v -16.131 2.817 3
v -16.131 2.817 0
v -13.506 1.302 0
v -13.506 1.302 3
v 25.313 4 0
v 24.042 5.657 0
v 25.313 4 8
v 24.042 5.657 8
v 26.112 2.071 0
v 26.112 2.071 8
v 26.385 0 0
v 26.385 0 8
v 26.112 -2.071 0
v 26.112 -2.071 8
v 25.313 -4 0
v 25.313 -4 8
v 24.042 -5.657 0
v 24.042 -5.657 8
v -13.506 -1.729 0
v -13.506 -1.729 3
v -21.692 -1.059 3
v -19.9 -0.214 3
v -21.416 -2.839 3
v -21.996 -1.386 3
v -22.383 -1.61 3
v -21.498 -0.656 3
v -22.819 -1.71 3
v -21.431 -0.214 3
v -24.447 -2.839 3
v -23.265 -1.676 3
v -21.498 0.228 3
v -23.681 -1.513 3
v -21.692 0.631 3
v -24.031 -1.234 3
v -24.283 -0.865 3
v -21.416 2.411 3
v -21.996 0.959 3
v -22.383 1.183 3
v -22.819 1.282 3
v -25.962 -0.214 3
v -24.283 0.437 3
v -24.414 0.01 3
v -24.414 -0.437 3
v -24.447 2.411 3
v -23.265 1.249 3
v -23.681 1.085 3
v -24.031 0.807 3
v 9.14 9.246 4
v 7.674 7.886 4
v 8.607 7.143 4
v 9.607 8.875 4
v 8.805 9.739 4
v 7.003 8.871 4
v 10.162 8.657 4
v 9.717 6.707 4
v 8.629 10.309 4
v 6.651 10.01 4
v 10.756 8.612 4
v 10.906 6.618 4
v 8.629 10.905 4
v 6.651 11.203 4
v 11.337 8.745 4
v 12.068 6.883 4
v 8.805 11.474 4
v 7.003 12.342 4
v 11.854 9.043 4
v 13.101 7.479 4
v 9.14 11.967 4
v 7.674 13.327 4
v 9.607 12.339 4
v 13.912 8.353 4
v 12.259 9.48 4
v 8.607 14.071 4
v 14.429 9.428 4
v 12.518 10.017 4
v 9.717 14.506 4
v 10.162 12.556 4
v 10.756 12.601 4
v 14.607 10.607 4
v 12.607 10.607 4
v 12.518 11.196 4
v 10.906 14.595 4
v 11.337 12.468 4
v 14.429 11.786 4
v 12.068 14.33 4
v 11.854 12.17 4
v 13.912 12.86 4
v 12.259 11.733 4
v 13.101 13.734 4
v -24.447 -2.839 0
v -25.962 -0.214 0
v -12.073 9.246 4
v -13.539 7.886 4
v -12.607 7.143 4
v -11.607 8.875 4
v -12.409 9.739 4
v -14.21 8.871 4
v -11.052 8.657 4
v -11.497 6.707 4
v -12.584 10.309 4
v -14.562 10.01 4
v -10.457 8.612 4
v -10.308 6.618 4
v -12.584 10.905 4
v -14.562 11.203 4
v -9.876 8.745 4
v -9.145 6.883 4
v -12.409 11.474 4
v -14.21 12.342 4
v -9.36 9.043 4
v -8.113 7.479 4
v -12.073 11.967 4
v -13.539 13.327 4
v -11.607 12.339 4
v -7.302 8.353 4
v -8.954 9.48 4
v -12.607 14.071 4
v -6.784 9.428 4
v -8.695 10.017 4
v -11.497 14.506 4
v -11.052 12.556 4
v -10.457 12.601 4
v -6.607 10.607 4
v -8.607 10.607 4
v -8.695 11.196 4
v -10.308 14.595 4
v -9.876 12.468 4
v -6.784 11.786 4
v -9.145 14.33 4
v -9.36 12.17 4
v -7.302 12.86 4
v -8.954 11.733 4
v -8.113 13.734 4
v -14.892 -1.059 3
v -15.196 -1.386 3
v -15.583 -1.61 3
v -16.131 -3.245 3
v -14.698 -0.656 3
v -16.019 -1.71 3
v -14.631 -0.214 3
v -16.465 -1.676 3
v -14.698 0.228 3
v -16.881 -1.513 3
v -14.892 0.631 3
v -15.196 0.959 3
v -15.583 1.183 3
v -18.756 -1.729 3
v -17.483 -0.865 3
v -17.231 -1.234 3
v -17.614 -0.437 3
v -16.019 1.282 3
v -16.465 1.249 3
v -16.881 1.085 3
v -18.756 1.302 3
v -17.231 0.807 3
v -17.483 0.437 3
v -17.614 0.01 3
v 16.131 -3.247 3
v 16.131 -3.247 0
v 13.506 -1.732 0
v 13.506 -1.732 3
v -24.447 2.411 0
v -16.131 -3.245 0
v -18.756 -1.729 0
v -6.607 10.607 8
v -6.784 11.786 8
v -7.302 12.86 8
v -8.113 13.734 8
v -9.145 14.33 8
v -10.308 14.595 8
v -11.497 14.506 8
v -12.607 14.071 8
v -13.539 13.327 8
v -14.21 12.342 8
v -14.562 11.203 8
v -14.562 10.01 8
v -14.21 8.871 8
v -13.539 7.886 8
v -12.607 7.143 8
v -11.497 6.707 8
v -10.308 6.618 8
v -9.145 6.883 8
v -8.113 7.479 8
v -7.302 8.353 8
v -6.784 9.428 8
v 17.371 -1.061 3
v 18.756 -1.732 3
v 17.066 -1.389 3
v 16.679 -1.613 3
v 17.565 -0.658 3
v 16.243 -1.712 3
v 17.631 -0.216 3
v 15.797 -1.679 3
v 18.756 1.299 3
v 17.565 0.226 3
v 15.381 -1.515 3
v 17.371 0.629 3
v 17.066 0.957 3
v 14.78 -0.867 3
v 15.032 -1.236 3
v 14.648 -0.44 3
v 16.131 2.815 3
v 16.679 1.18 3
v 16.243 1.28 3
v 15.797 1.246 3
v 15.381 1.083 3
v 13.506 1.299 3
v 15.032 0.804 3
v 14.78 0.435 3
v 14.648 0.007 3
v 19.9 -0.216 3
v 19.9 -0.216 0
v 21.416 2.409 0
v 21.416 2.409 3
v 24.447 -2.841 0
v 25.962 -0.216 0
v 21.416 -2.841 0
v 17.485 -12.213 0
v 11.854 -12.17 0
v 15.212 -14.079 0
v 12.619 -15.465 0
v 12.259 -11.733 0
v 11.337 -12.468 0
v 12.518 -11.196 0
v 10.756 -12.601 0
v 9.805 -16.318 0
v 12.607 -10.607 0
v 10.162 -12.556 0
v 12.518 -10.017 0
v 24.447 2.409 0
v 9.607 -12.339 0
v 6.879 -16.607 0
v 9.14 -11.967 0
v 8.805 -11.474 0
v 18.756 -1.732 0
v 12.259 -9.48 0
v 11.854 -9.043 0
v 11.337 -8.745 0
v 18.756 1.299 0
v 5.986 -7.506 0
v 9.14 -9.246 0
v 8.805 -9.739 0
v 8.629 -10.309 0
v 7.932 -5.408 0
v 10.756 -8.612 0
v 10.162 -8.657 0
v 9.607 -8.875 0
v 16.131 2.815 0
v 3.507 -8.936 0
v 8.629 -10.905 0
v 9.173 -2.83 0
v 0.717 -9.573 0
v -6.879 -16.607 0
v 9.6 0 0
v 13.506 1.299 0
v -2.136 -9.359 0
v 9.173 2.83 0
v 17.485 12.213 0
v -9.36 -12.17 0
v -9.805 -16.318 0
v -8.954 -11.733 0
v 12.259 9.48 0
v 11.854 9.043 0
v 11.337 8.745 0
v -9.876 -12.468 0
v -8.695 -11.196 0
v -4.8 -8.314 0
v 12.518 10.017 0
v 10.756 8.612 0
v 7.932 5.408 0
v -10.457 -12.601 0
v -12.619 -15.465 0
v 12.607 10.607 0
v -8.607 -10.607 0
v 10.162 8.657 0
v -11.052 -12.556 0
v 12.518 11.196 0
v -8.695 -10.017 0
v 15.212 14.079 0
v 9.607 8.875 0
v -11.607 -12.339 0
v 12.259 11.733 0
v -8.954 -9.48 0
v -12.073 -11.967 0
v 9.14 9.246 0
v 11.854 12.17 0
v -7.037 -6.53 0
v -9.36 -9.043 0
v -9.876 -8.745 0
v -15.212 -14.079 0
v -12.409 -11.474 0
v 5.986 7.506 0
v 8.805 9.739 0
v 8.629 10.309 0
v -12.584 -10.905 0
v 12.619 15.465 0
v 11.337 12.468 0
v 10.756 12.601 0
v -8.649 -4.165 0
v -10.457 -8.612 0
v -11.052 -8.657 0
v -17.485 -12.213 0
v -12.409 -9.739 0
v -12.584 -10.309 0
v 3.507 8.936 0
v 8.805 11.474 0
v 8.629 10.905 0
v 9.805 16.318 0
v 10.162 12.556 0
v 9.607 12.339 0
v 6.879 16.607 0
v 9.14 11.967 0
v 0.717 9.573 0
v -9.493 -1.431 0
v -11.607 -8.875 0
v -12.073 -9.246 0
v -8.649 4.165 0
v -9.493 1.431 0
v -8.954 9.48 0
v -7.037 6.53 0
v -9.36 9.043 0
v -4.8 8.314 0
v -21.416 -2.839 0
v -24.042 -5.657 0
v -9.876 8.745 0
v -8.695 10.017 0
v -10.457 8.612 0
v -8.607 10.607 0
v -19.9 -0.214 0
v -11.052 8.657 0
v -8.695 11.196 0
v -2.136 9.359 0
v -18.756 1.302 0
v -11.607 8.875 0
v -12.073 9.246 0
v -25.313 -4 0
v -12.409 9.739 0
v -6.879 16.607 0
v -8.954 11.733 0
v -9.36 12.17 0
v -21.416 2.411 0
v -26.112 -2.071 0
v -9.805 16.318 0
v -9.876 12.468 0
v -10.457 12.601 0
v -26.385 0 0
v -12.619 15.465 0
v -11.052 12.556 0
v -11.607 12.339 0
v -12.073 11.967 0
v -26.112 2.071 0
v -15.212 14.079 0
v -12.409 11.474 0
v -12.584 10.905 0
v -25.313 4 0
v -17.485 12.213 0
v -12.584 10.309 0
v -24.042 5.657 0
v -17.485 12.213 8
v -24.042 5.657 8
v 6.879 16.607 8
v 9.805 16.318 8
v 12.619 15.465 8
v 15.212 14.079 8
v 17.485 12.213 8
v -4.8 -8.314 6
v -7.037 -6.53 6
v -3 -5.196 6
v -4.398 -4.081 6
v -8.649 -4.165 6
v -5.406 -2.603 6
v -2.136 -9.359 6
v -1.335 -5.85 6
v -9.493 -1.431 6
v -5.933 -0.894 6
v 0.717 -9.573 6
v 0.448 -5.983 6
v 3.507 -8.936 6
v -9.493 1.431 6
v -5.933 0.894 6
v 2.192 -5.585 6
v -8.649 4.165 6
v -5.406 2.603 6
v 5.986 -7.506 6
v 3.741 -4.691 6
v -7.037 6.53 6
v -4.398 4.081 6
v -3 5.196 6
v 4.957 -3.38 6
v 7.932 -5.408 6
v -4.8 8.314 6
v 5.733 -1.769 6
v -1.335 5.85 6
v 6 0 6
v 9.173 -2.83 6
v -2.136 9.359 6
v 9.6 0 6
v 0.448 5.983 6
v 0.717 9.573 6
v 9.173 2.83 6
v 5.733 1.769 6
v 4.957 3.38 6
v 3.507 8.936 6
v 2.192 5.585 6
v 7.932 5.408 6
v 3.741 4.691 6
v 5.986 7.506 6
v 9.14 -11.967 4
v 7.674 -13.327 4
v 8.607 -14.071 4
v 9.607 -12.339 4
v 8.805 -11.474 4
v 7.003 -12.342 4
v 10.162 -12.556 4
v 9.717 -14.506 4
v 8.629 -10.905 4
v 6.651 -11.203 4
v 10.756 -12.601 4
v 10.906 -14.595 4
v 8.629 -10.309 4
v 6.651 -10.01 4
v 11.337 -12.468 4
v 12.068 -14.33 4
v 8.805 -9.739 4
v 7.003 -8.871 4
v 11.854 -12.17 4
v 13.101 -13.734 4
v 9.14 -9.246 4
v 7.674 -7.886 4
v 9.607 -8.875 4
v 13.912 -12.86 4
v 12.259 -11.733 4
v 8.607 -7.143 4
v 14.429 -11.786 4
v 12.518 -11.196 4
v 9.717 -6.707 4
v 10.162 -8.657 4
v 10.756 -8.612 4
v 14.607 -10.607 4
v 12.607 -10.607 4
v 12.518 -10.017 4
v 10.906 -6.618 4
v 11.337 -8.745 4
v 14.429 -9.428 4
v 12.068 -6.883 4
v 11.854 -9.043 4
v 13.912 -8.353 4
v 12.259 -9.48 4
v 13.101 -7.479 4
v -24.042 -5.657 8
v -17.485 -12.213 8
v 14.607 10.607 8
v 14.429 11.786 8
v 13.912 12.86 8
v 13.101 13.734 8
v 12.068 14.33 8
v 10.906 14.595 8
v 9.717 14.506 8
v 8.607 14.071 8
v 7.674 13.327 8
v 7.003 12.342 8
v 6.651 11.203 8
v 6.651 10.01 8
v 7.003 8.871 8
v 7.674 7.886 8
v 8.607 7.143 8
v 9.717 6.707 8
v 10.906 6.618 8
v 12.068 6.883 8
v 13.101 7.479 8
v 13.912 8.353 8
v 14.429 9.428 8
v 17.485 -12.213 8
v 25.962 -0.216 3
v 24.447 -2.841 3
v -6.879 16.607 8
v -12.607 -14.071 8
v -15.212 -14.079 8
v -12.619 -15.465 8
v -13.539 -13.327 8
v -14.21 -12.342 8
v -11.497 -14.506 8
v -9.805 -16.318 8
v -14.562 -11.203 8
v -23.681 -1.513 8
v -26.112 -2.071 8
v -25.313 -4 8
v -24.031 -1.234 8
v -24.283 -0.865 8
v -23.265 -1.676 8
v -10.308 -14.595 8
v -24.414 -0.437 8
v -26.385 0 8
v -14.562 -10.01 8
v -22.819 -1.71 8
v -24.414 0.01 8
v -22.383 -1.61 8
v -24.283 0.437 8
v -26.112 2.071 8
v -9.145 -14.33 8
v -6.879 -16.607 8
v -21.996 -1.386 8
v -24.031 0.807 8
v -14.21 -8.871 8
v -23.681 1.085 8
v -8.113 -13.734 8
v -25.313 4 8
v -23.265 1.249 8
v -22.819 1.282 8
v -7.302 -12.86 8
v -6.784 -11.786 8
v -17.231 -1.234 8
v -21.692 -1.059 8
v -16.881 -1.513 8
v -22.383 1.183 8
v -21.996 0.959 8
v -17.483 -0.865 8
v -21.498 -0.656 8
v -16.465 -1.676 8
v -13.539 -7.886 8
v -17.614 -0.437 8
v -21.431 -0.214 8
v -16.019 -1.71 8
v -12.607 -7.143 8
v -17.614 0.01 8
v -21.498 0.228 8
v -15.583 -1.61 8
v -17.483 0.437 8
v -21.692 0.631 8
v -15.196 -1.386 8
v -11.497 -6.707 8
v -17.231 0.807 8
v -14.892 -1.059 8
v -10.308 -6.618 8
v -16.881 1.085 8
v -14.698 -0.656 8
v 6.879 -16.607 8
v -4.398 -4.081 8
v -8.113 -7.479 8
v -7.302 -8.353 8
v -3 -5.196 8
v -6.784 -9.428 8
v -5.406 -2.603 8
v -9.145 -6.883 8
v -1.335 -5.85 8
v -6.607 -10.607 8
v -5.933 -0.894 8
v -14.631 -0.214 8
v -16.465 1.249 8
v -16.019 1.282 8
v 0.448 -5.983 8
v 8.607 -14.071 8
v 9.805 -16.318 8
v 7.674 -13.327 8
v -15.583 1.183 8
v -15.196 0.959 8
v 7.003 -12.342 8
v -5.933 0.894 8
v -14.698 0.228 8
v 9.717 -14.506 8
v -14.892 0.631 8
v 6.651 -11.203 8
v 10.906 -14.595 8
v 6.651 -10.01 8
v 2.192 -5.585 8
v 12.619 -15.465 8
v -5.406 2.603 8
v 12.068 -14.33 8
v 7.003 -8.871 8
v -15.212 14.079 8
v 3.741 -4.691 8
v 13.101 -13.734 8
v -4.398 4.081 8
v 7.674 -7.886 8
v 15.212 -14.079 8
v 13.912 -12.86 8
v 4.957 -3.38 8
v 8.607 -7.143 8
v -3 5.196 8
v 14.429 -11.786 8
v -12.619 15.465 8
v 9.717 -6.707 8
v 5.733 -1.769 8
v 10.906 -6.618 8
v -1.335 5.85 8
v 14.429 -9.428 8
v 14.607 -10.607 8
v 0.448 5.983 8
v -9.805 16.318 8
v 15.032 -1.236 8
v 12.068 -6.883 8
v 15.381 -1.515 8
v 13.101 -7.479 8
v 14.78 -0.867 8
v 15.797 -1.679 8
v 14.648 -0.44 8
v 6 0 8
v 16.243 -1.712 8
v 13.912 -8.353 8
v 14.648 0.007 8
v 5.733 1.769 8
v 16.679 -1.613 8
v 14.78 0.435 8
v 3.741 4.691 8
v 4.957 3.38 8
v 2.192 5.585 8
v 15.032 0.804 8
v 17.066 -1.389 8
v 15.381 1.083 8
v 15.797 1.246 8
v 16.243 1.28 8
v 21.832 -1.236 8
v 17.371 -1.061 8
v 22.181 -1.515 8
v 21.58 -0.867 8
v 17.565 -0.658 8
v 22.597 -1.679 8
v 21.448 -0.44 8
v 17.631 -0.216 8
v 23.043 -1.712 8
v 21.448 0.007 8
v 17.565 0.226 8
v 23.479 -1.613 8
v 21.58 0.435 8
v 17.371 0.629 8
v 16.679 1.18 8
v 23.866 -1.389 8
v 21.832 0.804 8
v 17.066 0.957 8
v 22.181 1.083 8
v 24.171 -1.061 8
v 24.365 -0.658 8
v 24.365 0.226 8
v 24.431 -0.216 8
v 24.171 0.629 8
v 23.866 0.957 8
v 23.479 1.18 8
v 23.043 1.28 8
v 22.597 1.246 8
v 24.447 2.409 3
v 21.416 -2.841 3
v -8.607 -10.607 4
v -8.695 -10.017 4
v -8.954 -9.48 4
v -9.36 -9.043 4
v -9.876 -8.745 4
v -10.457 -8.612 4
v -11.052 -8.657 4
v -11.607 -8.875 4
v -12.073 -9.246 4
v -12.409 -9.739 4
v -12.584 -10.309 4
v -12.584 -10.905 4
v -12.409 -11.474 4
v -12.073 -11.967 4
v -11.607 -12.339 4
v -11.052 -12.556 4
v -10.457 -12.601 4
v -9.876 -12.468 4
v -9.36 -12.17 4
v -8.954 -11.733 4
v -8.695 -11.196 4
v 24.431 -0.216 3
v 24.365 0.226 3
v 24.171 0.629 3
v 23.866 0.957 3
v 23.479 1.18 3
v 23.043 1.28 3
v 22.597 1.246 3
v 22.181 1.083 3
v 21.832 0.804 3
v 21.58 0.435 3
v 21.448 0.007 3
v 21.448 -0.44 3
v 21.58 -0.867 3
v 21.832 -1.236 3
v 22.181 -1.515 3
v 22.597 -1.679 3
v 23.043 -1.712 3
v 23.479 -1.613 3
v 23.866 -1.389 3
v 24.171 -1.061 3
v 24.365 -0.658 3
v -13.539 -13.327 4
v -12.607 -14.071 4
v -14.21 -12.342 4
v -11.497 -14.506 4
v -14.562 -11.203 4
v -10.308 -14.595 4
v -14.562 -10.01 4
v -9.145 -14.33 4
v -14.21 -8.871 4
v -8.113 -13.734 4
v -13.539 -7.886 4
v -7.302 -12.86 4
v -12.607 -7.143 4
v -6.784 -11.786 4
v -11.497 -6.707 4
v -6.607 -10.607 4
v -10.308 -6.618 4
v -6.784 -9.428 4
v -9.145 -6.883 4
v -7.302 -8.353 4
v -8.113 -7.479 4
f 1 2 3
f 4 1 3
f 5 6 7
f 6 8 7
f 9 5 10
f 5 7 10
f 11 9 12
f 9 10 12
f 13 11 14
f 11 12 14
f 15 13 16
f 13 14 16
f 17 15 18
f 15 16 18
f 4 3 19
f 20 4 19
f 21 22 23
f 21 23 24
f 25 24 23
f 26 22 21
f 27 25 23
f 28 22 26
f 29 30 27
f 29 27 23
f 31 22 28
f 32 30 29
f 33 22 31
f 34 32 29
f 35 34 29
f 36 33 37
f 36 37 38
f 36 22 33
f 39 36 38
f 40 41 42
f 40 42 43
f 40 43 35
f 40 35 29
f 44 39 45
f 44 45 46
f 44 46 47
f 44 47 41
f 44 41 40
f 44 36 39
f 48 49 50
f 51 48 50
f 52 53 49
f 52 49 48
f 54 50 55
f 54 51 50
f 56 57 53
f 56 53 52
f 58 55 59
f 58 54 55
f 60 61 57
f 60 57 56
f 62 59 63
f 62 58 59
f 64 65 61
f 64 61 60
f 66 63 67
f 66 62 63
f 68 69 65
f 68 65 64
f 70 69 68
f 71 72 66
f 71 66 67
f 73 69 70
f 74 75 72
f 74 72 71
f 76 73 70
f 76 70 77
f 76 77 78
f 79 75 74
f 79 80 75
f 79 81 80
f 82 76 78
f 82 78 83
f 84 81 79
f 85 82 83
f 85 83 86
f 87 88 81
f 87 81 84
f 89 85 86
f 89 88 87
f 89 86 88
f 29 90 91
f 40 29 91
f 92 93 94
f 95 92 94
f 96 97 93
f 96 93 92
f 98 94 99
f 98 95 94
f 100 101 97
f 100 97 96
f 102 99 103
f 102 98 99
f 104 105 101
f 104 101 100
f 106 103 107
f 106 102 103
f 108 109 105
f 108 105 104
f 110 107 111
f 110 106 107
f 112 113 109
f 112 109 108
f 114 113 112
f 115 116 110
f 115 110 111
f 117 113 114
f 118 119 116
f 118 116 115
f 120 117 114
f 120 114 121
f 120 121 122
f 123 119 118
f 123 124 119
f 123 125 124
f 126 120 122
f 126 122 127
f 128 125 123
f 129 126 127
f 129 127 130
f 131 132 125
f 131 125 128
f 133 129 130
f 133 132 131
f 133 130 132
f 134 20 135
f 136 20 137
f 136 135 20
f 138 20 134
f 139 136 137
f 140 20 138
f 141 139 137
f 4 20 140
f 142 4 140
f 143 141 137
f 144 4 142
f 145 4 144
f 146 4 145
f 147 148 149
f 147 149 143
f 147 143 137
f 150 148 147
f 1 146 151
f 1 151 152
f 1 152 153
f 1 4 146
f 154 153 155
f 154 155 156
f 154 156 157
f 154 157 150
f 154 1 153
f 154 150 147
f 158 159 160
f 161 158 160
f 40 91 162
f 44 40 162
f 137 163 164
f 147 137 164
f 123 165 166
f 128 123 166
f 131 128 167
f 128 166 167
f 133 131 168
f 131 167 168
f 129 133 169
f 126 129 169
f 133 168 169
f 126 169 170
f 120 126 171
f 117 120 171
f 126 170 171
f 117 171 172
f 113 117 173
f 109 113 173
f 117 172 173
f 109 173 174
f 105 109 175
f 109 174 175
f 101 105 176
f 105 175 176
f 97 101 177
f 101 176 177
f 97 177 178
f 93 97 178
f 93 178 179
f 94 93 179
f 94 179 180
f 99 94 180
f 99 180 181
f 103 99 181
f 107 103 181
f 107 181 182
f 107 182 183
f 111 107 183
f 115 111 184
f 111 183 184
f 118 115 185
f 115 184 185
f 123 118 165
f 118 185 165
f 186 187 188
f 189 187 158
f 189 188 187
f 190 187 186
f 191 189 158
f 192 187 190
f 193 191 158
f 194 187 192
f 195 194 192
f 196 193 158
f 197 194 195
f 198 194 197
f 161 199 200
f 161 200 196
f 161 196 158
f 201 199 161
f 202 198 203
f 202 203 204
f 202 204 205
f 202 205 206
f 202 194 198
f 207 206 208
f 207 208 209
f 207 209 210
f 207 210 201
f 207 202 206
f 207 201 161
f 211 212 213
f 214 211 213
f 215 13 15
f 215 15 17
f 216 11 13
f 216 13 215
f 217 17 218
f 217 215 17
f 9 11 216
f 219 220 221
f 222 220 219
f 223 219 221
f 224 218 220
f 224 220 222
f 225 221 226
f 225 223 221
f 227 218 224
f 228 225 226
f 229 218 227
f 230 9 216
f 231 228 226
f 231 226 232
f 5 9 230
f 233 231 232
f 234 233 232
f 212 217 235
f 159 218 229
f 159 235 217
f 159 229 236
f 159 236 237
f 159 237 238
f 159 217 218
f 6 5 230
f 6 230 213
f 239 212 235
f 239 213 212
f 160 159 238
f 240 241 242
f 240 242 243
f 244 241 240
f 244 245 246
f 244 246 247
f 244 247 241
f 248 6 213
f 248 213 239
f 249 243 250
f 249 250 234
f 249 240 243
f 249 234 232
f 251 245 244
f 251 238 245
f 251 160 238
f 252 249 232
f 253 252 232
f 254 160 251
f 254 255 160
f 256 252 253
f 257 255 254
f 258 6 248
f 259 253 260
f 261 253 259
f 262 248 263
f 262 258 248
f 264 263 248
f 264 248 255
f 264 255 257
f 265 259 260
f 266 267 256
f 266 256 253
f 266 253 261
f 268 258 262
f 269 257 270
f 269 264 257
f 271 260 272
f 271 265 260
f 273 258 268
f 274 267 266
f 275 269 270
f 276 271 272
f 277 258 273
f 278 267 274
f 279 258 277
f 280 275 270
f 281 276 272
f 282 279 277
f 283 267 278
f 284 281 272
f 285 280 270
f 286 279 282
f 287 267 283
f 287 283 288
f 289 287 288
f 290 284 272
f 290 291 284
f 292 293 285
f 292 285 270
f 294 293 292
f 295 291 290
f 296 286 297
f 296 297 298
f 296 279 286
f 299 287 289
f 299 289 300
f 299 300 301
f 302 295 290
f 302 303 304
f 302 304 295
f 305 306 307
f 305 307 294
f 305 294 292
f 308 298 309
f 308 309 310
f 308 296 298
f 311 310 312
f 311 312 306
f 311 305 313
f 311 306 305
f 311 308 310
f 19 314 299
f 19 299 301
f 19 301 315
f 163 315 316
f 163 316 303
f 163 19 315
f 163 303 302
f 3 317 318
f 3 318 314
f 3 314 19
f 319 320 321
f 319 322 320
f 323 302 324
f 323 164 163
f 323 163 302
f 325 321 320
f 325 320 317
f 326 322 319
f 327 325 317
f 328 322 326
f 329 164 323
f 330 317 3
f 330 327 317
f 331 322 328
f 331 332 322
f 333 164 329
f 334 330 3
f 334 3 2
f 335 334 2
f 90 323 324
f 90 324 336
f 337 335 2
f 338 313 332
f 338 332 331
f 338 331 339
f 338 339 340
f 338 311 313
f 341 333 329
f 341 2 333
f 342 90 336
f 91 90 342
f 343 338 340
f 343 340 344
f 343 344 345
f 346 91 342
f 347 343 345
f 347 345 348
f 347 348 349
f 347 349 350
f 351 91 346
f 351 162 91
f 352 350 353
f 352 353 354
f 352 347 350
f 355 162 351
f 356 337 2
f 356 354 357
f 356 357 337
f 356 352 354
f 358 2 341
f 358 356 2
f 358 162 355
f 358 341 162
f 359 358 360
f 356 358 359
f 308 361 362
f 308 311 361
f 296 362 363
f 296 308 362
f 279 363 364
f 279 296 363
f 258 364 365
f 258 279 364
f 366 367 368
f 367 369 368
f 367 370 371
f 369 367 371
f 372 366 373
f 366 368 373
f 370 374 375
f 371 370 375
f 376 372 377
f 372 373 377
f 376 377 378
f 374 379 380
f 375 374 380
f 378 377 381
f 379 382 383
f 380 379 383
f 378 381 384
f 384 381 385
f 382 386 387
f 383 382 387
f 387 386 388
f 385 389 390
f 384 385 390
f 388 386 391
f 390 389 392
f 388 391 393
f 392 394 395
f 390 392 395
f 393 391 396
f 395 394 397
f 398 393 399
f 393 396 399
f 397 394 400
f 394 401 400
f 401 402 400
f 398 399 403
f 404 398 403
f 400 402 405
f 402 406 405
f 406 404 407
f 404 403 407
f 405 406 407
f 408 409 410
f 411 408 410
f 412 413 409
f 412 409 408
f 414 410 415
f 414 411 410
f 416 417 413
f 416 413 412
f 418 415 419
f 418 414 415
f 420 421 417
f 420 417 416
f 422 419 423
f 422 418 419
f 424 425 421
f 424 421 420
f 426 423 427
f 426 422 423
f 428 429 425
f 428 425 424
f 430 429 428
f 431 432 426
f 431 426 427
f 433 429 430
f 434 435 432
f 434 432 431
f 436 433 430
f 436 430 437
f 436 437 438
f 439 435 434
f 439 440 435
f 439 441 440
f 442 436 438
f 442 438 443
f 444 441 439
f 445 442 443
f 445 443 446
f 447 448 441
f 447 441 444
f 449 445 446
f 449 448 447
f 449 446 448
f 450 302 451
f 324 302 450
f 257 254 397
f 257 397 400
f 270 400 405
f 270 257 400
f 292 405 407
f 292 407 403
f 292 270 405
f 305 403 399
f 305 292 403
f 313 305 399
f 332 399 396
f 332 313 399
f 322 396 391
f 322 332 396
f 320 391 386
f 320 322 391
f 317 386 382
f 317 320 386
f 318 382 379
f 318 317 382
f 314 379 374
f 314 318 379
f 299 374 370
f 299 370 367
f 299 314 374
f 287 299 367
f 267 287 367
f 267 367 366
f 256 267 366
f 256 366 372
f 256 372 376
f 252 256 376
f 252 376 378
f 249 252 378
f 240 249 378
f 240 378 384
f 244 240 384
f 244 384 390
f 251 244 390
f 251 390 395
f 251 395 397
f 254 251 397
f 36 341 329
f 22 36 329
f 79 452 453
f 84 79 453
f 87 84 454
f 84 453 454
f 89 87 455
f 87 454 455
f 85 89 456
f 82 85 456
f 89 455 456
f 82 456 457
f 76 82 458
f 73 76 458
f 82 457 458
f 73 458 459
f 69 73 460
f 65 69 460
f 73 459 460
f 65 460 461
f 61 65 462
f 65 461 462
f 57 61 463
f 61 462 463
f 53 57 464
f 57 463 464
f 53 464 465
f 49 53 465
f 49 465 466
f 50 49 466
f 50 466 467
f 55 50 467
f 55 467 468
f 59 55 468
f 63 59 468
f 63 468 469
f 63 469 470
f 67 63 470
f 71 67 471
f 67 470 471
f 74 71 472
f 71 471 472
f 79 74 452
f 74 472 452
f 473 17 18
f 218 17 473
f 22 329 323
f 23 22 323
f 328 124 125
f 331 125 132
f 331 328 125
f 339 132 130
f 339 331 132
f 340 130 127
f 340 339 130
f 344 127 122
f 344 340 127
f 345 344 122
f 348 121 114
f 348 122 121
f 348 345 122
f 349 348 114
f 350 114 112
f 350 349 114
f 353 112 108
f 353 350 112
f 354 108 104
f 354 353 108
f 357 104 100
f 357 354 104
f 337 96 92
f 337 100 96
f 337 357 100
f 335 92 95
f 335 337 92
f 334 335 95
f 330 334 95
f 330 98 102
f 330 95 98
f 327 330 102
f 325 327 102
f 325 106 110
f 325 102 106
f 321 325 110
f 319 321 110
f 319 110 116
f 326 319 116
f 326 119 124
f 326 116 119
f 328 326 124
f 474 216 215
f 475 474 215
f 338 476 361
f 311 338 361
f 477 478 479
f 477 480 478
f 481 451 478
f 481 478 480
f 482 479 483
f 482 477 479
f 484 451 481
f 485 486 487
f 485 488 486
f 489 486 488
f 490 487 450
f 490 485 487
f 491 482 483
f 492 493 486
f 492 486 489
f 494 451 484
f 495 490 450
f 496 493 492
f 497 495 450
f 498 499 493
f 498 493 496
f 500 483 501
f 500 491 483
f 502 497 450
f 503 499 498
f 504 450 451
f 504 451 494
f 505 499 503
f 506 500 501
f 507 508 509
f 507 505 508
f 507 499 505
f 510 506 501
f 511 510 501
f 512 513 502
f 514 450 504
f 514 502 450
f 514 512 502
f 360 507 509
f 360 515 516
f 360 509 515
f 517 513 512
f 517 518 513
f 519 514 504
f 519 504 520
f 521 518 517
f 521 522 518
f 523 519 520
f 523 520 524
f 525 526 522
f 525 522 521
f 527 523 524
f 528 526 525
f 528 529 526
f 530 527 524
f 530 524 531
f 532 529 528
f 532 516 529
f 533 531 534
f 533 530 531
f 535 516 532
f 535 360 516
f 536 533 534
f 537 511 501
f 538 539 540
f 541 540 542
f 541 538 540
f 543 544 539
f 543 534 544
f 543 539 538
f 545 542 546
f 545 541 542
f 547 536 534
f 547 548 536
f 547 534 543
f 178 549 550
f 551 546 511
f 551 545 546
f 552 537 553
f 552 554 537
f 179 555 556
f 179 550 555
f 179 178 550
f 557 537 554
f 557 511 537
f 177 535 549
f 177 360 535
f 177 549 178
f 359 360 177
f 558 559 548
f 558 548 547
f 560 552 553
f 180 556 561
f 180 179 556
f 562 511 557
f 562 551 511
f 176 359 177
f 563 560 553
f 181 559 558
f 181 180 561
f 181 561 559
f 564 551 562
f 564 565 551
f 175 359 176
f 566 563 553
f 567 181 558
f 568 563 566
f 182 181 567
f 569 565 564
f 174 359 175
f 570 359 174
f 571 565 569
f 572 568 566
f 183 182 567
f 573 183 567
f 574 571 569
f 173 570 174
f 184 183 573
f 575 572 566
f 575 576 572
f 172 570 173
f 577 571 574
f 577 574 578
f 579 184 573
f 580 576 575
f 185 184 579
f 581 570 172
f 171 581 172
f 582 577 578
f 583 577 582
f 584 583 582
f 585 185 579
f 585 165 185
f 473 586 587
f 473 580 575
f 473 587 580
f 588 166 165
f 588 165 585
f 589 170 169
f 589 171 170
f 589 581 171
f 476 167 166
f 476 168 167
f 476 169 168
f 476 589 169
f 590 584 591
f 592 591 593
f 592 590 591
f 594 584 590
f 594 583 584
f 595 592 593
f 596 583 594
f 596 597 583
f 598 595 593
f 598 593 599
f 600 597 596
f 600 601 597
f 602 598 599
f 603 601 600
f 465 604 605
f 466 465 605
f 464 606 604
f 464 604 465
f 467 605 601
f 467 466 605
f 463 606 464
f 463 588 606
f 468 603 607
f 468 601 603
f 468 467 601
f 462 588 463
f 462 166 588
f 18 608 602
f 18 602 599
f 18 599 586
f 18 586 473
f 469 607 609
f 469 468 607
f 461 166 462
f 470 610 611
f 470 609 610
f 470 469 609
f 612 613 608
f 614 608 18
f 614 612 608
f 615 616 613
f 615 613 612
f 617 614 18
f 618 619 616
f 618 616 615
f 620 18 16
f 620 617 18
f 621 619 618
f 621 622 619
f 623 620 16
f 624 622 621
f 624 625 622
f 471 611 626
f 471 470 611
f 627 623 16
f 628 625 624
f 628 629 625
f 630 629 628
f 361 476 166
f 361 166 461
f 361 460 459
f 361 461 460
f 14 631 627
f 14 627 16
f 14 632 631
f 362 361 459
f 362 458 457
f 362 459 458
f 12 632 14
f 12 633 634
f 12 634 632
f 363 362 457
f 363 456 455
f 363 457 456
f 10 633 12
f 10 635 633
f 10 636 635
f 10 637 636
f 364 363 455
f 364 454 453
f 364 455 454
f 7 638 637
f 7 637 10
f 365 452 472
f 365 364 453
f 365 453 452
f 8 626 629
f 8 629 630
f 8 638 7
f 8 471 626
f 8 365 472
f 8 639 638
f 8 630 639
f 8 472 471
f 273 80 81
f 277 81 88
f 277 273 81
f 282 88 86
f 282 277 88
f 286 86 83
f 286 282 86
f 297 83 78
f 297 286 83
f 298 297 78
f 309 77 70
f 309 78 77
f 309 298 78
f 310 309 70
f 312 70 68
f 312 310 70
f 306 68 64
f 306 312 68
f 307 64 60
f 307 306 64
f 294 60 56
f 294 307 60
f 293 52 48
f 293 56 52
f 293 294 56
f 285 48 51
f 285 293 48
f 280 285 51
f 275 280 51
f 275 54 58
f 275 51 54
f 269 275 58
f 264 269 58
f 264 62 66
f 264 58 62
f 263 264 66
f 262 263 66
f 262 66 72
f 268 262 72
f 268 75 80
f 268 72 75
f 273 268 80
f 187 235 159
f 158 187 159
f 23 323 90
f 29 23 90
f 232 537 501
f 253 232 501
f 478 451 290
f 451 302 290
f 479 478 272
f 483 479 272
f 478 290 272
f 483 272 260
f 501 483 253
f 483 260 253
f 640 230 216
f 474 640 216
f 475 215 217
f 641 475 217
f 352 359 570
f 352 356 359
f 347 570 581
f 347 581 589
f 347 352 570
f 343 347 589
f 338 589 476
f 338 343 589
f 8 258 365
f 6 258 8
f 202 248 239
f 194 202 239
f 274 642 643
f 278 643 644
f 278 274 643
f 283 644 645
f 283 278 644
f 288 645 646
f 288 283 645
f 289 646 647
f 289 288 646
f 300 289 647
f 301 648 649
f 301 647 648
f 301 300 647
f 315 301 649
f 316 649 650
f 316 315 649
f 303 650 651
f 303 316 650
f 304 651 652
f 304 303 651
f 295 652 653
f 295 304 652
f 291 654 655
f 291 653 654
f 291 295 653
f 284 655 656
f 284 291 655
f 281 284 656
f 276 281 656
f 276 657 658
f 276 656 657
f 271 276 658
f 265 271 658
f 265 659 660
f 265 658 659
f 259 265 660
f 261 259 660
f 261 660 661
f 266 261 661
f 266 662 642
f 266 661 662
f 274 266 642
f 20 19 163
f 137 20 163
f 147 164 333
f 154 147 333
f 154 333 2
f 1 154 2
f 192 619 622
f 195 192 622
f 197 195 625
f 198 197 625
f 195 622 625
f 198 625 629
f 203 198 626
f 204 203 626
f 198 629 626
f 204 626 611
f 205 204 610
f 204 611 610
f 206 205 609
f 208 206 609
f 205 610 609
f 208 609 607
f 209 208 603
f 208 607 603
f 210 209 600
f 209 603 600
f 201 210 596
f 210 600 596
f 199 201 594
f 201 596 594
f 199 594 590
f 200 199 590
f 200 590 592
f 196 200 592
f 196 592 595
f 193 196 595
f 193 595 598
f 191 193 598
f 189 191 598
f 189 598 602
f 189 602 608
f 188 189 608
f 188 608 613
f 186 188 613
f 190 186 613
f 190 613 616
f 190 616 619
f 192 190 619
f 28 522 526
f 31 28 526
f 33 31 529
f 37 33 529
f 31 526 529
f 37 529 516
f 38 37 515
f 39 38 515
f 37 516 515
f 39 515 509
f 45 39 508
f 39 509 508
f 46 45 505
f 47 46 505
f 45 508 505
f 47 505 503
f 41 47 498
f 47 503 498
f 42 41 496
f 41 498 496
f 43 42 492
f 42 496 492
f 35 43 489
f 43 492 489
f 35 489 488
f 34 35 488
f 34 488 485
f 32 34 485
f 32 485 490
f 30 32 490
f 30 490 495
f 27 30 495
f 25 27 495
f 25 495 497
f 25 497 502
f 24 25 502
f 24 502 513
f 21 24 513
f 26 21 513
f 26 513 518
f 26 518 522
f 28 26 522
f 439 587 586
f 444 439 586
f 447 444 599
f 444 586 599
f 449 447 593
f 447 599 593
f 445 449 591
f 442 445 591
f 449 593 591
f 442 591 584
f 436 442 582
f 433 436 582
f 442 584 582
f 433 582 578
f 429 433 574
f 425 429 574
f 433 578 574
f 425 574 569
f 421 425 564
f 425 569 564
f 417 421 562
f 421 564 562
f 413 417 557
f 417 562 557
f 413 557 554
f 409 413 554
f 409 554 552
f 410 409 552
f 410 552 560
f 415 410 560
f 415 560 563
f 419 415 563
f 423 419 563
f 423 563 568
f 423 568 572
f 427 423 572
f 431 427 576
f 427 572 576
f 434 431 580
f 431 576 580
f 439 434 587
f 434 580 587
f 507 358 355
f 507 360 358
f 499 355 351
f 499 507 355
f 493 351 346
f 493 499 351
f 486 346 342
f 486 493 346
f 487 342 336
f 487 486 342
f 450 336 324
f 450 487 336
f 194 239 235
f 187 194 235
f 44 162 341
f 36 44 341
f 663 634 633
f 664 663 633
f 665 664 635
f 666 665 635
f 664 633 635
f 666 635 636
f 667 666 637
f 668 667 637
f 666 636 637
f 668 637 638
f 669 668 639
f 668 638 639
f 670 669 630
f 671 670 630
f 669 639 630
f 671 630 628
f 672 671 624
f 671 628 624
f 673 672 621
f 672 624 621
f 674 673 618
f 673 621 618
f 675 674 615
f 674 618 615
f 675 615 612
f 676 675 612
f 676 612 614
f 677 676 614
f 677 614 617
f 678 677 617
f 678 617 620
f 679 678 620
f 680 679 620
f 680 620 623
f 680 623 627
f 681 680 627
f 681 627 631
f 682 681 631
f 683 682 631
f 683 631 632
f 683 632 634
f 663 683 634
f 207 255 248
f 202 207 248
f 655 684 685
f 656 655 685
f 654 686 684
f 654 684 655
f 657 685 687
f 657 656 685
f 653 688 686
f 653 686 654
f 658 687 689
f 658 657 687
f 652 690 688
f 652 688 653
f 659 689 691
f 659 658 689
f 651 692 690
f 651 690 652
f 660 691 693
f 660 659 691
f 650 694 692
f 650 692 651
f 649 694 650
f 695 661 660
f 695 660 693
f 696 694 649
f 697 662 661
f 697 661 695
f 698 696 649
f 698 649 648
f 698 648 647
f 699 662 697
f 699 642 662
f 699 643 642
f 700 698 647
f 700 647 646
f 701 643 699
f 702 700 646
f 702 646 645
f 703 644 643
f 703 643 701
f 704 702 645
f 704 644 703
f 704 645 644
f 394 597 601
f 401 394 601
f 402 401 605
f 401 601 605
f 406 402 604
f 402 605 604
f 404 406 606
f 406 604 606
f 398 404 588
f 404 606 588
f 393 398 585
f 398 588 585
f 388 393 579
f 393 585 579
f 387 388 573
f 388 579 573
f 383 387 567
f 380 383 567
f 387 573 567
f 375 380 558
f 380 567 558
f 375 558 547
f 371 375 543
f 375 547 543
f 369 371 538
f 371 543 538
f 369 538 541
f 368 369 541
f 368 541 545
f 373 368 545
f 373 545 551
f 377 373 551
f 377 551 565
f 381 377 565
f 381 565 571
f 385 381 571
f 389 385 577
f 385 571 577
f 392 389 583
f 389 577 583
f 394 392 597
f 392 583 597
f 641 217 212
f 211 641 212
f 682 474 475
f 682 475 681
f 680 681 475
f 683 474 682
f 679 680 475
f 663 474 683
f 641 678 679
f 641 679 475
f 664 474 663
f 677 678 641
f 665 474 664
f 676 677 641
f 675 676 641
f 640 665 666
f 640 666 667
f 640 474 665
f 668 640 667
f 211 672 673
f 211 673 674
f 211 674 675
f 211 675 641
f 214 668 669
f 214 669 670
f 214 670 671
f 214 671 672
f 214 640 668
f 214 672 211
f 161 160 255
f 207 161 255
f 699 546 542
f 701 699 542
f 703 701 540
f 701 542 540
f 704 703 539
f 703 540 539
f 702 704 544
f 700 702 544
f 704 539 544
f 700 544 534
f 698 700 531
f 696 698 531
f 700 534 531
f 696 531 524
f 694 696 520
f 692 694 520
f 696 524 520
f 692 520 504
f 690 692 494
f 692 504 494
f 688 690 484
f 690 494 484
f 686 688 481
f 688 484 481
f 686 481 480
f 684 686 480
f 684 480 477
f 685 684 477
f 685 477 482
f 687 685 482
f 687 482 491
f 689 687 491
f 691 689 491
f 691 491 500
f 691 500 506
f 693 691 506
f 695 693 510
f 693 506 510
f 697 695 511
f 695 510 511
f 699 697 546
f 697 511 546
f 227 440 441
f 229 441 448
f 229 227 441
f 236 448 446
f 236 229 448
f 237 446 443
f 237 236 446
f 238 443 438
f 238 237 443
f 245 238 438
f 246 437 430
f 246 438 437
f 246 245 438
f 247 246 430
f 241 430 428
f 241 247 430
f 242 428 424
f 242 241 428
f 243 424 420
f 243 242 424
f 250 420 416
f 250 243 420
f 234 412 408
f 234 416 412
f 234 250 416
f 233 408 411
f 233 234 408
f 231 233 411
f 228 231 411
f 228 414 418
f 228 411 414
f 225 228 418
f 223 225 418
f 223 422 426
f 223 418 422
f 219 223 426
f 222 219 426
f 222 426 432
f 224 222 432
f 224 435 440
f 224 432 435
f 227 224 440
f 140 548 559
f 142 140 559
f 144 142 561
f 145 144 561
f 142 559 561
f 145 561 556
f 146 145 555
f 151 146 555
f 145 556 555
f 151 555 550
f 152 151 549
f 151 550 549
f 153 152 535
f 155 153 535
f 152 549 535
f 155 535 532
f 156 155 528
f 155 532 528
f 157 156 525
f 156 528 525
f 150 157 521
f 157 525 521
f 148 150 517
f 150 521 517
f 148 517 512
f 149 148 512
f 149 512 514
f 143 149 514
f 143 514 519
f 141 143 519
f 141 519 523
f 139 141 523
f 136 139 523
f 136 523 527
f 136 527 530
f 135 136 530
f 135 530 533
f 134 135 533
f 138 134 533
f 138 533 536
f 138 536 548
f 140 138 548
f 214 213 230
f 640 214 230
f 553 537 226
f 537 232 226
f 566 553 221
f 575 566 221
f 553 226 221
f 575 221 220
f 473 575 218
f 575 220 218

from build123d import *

# Parameters (mm, degrees)
SKETCH1_R           = 2
SKETCH1_R_2         = 9.6
BOSS_EXTRUDE1_DEPTH = 8
SKETCH2_R           = 4
CUT_EXTRUDE1_DEPTH  = 4
SKETCH3_R           = 1.5
CUT_EXTRUDE2_DEPTH  = 10
CUT_EXTRUDE3_DEPTH  = 3
FILLET1_R           = 8
CUT_EXTRUDE4_DEPTH  = 9
FILLET2_R           = 15
SKETCH7_R           = 9.6
SKETCH7_R_2         = 6
BOSS_EXTRUDE2_DEPTH = 2


with BuildPart() as part:
    # Sketch1 → Boss-Extrude1 (new body)
    with BuildSketch(Plane.XY):
        Polygon((-29.69848481, 0), (0, 29.69848481), (29.69848481, 0), (0, -29.69848481), align=None)
        with Locations((10.606601718, 10.606601718)):
            Circle(SKETCH1_R, mode=Mode.SUBTRACT)
        with Locations((10.606601718, -10.606601718)):
            Circle(SKETCH1_R, mode=Mode.SUBTRACT)
        with Locations((-10.606601718, -10.606601718)):
            Circle(SKETCH1_R, mode=Mode.SUBTRACT)
        with Locations((-10.606601718, 10.606601718)):
            Circle(SKETCH1_R, mode=Mode.SUBTRACT)
        Circle(SKETCH1_R_2, mode=Mode.SUBTRACT)
    extrude(amount=BOSS_EXTRUDE1_DEPTH)

    # Sketch2 → Cut-Extrude1 (cut)
    with BuildSketch(Plane.XY.offset(8)):
        with Locations((-10.606601718, 10.606601718)):
            Circle(SKETCH2_R)
        with Locations((10.606601718, 10.606601718)):
            Circle(SKETCH2_R)
        with Locations((10.606601718, -10.606601718)):
            Circle(SKETCH2_R)
        with Locations((-10.606601718, -10.606601718)):
            Circle(SKETCH2_R)
    extrude(amount=-CUT_EXTRUDE1_DEPTH, mode=Mode.SUBTRACT)

    # Sketch3 → Cut-Extrude2 (cut)
    with BuildSketch(Plane.XY.offset(8)):
        with Locations((-22.931196288, -0.213718328)):
            Circle(SKETCH3_R)
        with Locations((-16.131196288, -0.213718328)):
            Circle(SKETCH3_R)
        with Locations((16.131196288, -0.216214782)):
            Circle(SKETCH3_R)
        with Locations((22.931196288, -0.216214782)):
            Circle(SKETCH3_R)
    extrude(amount=-CUT_EXTRUDE2_DEPTH, mode=Mode.SUBTRACT)

    # Sketch4 → Cut-Extrude3 (cut)
    with BuildSketch(Plane(origin=(0, 0, 0), x_dir=(-1, 0, 0), z_dir=(0, 0, -1))):
        Polygon((-24.446740745, 2.408785218), (-25.962285202, -0.216214782), (-24.446740745, -2.841214782), (-21.415651832, -2.841214782), (-19.900107375, -0.216214782), (-21.415651832, 2.408785218), align=None)
        Polygon((-13.506196288, 1.299329674), (-16.131196288, 2.814874131), (-18.756196288, 1.299329674), (-18.756196288, -1.731759239), (-16.131196288, -3.247303696), (-13.506196288, -1.731759239), align=None)
        Polygon((18.756196288, 1.301826129), (16.131196288, 2.817370585), (13.506196288, 1.301826129), (13.506196288, -1.729262785), (16.131196288, -3.244807241), (18.756196288, -1.729262785), align=None)
        Polygon((21.415651832, 2.411281672), (19.900107375, -0.213718328), (21.415651832, -2.838718328), (24.446740745, -2.838718328), (25.962285202, -0.213718328), (24.446740745, 2.411281672), align=None)
    extrude(amount=-CUT_EXTRUDE3_DEPTH, mode=Mode.SUBTRACT)

    # Fillet1
    fillet1_edges = [part.edges().sort_by_distance(p)[0] for p in [
        (-29.69848481, 0, 4),
        (29.69848481, 0, 4),
    ]]
    fillet(fillet1_edges, radius=FILLET1_R)

    # Sketch5 → Cut-Extrude4 (cut, through all)
    with BuildSketch(Plane.XY.offset(8)):
        Polygon((13.091883092, 16.606601718), (0, 29.69848481), (-13.091883092, 16.606601718), align=None)
        Polygon((-13.091883092, -16.606601718), (0, -29.69848481), (13.091883092, -16.606601718), align=None)
    extrude(amount=-CUT_EXTRUDE4_DEPTH, mode=Mode.SUBTRACT)

    # Fillet2
    fillet2_edges = [part.edges().sort_by_distance(p)[0] for p in [
        (13.091883092, 16.606601718, 4),
        (-13.091883092, 16.606601718, 4),
        (-13.091883092, -16.606601718, 4),
        (13.091883092, -16.606601718, 4),
    ]]
    fillet(fillet2_edges, radius=FILLET2_R)

    # Sketch7 → Boss-Extrude2 (add)
    with BuildSketch(Plane.XY.offset(8)):
        Circle(SKETCH7_R)
        Circle(SKETCH7_R_2, mode=Mode.SUBTRACT)
    extrude(amount=-BOSS_EXTRUDE2_DEPTH)


solid = part.part
